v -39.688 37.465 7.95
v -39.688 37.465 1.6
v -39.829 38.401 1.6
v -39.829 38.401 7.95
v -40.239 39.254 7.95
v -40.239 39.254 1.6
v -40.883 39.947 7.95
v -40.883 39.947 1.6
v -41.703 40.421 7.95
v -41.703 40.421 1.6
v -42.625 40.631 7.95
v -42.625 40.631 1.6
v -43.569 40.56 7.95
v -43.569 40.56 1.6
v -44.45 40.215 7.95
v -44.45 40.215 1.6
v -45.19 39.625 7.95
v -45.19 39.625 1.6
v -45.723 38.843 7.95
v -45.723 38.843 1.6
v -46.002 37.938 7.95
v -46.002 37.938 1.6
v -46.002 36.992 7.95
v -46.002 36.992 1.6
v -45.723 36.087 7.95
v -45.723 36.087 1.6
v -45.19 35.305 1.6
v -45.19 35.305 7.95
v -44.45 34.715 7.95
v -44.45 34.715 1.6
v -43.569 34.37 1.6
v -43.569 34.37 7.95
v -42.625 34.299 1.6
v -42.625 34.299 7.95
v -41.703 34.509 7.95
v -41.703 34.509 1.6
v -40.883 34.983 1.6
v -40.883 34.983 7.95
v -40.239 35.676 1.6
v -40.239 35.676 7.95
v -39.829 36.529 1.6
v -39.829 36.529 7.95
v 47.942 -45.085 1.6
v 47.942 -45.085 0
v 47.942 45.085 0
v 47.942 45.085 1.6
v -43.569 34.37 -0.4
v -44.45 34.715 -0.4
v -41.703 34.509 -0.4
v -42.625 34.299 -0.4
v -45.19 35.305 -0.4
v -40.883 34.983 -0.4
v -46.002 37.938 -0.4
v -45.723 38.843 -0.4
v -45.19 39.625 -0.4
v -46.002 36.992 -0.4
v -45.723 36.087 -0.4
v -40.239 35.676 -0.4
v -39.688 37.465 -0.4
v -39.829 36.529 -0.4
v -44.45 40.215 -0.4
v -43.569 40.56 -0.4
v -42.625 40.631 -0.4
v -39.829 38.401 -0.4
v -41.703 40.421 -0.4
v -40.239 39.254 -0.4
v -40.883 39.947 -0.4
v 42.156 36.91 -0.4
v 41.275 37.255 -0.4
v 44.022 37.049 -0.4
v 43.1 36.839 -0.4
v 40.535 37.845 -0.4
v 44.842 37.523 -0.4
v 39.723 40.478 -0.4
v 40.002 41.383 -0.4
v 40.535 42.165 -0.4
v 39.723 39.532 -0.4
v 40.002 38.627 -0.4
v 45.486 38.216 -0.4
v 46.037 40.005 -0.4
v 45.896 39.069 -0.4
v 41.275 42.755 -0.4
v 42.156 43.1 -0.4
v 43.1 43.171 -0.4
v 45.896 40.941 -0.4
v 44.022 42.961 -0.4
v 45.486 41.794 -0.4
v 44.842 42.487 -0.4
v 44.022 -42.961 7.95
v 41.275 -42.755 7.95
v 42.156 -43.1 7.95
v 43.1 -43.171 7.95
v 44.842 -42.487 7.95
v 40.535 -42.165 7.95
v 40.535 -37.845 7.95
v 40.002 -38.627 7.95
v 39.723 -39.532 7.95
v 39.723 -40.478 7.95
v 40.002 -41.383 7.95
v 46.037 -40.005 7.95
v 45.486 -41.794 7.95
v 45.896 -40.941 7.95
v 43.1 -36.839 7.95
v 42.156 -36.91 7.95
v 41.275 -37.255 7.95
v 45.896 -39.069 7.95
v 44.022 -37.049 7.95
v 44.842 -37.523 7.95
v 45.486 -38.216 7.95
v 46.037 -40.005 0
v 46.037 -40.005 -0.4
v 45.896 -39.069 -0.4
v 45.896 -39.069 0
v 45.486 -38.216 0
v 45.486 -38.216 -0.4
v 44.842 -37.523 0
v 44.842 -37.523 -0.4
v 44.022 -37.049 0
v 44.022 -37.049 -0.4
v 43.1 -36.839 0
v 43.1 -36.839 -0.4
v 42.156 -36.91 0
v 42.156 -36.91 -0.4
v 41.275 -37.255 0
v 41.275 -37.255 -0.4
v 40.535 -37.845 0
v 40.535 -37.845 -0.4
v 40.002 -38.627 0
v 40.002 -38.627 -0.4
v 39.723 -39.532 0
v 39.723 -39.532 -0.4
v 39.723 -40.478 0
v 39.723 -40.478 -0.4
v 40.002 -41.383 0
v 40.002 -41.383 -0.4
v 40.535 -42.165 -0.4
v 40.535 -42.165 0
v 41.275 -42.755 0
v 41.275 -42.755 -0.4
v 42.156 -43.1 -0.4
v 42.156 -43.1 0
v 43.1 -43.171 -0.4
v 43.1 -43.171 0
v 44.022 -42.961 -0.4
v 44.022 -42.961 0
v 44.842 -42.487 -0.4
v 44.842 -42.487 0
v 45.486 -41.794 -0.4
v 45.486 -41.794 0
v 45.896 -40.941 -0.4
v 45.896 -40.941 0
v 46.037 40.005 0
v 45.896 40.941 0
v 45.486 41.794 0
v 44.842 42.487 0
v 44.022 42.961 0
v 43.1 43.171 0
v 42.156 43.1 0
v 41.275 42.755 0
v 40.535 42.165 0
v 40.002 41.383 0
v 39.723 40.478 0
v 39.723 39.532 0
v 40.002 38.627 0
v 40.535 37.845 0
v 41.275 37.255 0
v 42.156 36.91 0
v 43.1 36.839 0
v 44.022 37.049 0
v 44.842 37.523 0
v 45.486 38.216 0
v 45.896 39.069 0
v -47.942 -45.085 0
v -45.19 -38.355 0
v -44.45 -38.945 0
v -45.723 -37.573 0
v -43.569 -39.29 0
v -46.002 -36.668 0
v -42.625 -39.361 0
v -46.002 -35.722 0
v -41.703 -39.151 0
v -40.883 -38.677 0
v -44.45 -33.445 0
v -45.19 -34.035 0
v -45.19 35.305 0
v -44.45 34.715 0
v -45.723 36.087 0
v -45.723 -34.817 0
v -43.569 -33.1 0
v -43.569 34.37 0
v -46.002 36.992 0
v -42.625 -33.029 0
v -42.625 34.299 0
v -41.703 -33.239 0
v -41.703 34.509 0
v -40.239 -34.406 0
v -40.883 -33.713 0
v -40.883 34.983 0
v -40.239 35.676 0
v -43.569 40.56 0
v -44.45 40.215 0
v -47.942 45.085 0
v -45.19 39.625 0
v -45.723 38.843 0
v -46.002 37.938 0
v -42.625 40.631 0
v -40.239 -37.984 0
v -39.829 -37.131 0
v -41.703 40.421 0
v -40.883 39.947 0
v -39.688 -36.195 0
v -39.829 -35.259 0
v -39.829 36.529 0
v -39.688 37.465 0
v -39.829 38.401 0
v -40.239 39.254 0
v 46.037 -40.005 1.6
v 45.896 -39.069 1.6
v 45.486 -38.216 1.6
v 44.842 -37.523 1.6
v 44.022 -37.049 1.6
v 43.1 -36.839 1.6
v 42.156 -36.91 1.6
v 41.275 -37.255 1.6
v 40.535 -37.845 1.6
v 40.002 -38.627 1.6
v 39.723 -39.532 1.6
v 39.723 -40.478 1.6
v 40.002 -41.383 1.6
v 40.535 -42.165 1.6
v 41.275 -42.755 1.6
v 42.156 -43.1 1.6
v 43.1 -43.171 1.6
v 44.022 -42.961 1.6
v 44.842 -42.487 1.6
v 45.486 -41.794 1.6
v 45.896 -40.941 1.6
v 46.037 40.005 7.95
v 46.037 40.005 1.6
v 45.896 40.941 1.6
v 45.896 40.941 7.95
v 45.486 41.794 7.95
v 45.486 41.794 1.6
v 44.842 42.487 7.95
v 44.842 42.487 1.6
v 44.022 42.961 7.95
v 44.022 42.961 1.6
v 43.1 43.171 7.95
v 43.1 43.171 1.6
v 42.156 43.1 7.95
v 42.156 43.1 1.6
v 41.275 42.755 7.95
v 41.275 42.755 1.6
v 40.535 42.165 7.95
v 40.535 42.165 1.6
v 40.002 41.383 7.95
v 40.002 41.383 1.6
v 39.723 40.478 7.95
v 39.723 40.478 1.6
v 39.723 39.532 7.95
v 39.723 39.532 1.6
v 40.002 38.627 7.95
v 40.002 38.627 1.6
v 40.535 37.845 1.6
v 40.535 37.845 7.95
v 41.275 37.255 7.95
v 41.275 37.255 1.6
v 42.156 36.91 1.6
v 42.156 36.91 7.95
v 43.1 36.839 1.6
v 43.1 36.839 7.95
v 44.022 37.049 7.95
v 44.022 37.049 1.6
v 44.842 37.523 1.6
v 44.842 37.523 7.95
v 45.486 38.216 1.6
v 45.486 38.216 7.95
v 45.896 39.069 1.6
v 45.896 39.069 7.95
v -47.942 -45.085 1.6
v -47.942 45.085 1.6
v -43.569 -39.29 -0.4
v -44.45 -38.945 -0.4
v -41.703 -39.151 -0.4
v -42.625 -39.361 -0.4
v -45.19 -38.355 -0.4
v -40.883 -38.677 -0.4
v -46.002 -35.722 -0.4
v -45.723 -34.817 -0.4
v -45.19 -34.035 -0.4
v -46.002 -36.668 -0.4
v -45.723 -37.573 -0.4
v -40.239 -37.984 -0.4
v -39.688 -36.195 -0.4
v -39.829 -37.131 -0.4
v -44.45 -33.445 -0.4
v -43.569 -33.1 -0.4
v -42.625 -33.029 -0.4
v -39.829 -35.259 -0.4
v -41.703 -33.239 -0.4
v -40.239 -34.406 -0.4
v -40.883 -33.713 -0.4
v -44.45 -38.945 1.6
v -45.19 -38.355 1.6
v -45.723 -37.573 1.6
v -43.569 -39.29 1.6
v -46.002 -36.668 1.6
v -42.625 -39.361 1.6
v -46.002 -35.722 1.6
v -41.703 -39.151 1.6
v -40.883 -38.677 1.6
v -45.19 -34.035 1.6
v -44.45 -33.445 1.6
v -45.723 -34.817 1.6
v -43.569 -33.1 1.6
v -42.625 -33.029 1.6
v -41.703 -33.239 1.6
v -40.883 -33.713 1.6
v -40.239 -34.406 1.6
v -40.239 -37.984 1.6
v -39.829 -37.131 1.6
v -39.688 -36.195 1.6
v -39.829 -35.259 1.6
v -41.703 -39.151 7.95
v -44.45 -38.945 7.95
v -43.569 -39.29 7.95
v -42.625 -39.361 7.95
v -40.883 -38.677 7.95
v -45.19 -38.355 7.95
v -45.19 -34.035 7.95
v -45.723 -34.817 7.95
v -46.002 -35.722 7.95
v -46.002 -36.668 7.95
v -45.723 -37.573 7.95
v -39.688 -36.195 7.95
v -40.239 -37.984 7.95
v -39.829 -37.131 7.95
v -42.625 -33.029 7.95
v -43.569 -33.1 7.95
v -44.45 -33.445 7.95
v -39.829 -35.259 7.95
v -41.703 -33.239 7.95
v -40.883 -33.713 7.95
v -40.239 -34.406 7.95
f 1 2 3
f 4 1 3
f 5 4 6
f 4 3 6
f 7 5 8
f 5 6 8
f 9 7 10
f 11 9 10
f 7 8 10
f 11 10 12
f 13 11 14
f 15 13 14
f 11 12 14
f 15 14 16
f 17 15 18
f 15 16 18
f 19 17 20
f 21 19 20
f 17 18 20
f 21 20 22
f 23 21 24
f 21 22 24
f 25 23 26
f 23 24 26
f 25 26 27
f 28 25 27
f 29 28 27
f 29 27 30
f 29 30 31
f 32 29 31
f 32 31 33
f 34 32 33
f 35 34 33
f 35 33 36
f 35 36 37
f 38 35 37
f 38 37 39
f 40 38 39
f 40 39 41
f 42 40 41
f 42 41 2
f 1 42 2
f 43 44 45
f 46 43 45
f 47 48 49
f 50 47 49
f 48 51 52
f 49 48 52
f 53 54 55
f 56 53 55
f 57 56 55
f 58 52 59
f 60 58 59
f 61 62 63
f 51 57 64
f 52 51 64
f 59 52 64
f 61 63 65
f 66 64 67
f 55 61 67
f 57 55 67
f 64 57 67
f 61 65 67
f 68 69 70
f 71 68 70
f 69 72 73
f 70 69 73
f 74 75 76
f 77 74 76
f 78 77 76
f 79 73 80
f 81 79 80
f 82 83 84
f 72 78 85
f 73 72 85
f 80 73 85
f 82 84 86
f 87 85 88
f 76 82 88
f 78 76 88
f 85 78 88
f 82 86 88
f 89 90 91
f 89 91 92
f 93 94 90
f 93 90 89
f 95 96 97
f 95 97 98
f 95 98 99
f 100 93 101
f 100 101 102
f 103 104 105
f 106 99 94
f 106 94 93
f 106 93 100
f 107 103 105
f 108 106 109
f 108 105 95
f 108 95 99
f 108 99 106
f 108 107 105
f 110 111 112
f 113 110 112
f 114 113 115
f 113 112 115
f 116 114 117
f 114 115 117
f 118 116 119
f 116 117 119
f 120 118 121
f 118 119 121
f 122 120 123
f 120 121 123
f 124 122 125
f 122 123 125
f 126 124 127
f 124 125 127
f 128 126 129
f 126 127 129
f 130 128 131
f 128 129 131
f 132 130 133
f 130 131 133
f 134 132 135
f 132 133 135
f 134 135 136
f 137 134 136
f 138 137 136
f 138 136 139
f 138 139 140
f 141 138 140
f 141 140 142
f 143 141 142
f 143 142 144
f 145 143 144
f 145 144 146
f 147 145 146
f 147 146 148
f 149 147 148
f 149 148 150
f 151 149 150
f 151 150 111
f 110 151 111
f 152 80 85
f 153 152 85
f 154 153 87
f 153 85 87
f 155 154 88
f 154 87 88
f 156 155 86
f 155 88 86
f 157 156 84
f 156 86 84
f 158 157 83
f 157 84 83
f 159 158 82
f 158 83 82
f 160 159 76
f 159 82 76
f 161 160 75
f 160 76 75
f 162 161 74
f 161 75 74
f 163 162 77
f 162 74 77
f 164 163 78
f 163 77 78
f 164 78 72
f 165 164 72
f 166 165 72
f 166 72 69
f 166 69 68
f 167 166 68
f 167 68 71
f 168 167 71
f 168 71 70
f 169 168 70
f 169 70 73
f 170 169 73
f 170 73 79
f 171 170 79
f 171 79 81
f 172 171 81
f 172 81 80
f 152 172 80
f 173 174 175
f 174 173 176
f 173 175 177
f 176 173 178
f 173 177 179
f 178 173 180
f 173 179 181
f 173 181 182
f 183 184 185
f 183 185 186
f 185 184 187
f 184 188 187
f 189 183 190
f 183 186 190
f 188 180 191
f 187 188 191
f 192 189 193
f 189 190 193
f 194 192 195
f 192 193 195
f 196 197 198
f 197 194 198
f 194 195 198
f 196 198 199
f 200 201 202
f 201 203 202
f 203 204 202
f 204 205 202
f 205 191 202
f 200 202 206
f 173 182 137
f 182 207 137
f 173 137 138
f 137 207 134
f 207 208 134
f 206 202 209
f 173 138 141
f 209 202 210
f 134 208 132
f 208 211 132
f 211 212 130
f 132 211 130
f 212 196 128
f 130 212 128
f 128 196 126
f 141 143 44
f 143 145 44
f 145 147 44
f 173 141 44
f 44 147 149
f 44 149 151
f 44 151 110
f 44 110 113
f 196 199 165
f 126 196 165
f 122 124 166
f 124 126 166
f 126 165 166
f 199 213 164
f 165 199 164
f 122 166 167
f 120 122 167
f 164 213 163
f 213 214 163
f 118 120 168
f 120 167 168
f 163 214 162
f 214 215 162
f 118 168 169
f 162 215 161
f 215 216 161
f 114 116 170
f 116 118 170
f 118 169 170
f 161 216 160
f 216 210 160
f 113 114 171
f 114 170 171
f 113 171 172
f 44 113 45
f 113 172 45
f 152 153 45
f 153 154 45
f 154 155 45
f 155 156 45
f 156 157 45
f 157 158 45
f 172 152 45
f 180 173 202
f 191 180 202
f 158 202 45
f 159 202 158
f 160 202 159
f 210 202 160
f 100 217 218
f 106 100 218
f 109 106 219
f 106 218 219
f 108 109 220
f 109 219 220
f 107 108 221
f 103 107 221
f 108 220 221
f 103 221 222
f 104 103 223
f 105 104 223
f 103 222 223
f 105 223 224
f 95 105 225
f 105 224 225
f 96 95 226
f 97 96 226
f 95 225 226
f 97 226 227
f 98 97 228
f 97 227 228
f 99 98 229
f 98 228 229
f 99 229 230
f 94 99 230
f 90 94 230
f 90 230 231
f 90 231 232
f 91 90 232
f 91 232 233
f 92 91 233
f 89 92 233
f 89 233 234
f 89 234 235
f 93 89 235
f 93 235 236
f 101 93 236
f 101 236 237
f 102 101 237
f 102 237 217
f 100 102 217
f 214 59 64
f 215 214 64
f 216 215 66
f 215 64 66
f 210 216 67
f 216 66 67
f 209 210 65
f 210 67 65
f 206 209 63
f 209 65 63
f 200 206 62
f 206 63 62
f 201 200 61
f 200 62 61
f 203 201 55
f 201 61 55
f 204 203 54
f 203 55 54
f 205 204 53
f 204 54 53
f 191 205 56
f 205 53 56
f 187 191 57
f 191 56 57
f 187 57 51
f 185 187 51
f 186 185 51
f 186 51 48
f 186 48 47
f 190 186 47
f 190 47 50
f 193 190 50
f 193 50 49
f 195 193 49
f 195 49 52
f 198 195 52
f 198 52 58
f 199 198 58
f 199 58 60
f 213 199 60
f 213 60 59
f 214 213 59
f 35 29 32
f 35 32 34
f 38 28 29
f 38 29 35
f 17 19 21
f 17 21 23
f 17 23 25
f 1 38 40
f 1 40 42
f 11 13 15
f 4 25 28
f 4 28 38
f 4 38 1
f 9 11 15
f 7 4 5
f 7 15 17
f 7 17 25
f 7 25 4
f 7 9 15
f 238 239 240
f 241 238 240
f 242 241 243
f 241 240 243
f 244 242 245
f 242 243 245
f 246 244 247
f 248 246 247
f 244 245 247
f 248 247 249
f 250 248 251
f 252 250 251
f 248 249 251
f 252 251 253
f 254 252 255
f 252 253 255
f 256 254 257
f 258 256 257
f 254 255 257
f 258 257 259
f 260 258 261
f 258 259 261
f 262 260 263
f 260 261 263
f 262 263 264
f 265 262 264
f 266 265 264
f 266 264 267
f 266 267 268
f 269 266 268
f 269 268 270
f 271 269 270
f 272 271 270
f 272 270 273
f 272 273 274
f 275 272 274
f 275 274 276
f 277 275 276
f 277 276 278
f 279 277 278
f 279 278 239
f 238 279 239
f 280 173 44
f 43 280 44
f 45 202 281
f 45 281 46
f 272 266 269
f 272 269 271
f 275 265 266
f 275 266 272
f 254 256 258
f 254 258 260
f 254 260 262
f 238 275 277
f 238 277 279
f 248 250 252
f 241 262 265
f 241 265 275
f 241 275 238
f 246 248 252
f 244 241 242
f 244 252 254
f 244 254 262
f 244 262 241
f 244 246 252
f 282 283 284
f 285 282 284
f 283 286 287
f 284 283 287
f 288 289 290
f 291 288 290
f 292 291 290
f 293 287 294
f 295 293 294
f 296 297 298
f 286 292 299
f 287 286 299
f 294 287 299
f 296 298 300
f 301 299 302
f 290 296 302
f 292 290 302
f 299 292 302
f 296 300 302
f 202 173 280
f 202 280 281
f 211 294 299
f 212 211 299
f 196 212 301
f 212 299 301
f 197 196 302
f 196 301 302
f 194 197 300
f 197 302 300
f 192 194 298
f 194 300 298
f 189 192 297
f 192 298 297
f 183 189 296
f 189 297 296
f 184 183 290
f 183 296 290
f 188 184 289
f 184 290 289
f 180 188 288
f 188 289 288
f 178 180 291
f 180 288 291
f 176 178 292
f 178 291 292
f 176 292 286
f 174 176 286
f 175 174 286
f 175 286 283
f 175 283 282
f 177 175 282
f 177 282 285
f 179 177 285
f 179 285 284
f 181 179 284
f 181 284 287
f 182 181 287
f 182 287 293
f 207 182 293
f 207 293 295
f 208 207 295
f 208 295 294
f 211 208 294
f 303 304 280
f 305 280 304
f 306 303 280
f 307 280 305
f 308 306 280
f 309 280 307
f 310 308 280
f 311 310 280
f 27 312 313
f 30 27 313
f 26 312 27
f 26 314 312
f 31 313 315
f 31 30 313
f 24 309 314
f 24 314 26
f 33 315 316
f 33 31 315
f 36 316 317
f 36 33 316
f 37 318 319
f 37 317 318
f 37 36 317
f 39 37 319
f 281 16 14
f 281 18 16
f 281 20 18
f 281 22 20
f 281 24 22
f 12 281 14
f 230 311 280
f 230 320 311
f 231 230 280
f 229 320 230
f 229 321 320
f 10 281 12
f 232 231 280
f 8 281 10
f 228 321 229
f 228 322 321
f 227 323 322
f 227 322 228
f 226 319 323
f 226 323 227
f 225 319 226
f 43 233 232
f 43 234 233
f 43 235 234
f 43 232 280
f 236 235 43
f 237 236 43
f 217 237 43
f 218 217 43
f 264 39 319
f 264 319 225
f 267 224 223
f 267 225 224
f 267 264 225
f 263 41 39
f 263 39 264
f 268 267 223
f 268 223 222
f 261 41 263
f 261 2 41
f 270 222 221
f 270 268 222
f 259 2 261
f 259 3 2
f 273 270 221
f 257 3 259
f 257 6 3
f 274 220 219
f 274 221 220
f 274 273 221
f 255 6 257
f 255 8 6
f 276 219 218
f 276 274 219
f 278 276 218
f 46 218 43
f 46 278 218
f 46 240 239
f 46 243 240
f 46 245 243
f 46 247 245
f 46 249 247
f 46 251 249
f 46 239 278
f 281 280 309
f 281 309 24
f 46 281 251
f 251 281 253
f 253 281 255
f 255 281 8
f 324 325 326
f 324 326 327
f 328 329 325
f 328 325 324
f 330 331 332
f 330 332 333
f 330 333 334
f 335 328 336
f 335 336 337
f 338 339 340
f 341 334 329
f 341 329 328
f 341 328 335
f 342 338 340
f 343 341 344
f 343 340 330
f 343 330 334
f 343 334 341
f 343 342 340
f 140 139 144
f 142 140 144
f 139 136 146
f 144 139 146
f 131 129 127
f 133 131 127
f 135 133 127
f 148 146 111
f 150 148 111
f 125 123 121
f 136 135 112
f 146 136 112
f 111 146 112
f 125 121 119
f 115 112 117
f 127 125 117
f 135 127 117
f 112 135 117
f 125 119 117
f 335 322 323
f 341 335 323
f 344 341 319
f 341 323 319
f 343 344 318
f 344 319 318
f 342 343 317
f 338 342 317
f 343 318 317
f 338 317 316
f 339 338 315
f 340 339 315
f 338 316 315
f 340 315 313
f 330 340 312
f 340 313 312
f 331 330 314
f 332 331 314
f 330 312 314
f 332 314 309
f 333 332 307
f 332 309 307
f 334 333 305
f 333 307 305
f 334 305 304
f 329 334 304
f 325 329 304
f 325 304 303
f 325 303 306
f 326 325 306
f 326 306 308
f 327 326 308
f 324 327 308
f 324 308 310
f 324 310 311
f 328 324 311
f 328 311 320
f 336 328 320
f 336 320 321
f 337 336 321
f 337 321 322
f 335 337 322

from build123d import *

# Parameters (mm, degrees)
SKETCH1_W                = 95.885
SKETCH1_H                = 90.17
SKETCH1_R                = 3.175
BOSS_EXTRUDE1_DEPTH      = 1.6
BOSS_EXTRUDE2_DEPTH      = 7.95
BOSS_EXTRUDE2_DEPTH_BACK = 0.4
SKETCH1_3_R              = 3.175


with BuildPart() as part:
    # Sketch1 → Boss-Extrude1 (new body)
    with BuildSketch(Plane.XY):
        Rectangle(SKETCH1_W, SKETCH1_H)
        with Locations((42.8625, -40.005)):
            Circle(SKETCH1_R, mode=Mode.SUBTRACT)
        with Locations((-42.8625, -36.195)):
            Circle(SKETCH1_R, mode=Mode.SUBTRACT)
        with Locations((-42.8625, 37.465)):
            Circle(SKETCH1_R, mode=Mode.SUBTRACT)
        with Locations((42.8625, 40.005)):
            Circle(SKETCH1_R, mode=Mode.SUBTRACT)
    extrude(amount=BOSS_EXTRUDE1_DEPTH)

    # Sketch1<3> → Boss-Extrude2 (add, two sides: drawn at the far end of the back side and taken through both)
    with BuildSketch(Plane.XY.offset(-BOSS_EXTRUDE2_DEPTH_BACK)):
        with Locations((42.8625, 40.005)):
            Circle(SKETCH1_3_R)
        with Locations((-42.8625, -36.195)):
            Circle(SKETCH1_3_R)
        with Locations((42.8625, -40.005)):
            Circle(SKETCH1_3_R)
        with Locations((-42.8625, 37.465)):
            Circle(SKETCH1_3_R)
    extrude(amount=BOSS_EXTRUDE2_DEPTH + BOSS_EXTRUDE2_DEPTH_BACK)


solid = part.part
